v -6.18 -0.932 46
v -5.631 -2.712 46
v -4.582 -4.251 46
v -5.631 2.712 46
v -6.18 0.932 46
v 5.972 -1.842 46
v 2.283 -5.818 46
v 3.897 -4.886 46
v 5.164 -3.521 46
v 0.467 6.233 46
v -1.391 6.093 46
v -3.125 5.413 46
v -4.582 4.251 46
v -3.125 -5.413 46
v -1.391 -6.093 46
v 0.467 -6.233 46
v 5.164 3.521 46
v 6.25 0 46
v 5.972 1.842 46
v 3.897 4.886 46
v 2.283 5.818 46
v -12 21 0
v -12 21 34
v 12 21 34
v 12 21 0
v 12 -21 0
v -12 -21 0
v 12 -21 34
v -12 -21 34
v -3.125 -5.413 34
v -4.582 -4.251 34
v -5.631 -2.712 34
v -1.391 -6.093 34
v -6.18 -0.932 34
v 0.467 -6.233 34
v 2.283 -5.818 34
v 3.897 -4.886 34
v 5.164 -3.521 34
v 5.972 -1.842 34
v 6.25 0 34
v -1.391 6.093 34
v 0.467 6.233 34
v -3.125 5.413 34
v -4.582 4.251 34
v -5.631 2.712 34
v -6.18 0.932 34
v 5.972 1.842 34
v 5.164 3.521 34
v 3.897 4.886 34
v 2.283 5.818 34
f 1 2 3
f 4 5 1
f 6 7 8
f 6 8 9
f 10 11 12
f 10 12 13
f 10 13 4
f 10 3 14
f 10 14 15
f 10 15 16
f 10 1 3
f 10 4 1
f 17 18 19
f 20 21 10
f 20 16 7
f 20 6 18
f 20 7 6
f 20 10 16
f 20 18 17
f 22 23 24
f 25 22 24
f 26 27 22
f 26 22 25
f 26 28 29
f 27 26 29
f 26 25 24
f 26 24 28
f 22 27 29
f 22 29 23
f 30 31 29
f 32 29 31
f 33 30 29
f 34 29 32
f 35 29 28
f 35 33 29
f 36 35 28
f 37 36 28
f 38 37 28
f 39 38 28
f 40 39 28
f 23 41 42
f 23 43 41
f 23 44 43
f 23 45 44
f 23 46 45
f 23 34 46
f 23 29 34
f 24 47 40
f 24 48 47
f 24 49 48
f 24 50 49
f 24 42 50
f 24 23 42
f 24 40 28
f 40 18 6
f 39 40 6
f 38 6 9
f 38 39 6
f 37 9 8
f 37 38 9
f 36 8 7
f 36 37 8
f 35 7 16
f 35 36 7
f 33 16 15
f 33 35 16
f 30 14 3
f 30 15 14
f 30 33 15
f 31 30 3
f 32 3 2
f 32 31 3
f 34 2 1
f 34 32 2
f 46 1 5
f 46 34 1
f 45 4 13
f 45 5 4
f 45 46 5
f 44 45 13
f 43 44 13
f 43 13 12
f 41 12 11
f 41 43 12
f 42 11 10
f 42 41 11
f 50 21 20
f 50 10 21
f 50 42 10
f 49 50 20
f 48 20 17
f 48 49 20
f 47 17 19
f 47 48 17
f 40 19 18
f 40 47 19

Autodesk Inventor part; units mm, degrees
ref_plane "YZ Plane" through (0, 0, 0) normal (1, 0, 0) x (0, 1, 0)
ref_plane "XZ Plane" through (0, 0, 0) normal (0, 1, 0) x (-1, 0, 0)
ref_plane "XY Plane" through (0, 0, 0) normal (0, 0, 1) x (1, 0, 0)
sketch "Sketch1" plane through (0, 0, 0) normal (0, 0, 1) x (1, 0, 0)
  line L0 (-12, 21) -> (12, 21)
  line L1 (12, 21) -> (12, -21)
  line L2 (12, -21) -> (-12, -21)
  line L3 (-12, -21) -> (-12, 21)
  point P0 (0, 0)
  point P1 (12, 0)
  point P2 (0, 21)
  dimension "d0" = 24
  dimension "d1" = 42
extrude "Extrusion1" add sketch "Sketch1" along normal blind 34
sketch "Sketch2" plane through (0, 0, 34) normal (0, 0, 1) x (1, 0, 0)
  circle A0 centre (0, 0) radius 6.25
  dimension "d4" = 12.5
extrude "Extrusion2" add sketch "Sketch2" along normal blind 12
properties part number "s823switch"
